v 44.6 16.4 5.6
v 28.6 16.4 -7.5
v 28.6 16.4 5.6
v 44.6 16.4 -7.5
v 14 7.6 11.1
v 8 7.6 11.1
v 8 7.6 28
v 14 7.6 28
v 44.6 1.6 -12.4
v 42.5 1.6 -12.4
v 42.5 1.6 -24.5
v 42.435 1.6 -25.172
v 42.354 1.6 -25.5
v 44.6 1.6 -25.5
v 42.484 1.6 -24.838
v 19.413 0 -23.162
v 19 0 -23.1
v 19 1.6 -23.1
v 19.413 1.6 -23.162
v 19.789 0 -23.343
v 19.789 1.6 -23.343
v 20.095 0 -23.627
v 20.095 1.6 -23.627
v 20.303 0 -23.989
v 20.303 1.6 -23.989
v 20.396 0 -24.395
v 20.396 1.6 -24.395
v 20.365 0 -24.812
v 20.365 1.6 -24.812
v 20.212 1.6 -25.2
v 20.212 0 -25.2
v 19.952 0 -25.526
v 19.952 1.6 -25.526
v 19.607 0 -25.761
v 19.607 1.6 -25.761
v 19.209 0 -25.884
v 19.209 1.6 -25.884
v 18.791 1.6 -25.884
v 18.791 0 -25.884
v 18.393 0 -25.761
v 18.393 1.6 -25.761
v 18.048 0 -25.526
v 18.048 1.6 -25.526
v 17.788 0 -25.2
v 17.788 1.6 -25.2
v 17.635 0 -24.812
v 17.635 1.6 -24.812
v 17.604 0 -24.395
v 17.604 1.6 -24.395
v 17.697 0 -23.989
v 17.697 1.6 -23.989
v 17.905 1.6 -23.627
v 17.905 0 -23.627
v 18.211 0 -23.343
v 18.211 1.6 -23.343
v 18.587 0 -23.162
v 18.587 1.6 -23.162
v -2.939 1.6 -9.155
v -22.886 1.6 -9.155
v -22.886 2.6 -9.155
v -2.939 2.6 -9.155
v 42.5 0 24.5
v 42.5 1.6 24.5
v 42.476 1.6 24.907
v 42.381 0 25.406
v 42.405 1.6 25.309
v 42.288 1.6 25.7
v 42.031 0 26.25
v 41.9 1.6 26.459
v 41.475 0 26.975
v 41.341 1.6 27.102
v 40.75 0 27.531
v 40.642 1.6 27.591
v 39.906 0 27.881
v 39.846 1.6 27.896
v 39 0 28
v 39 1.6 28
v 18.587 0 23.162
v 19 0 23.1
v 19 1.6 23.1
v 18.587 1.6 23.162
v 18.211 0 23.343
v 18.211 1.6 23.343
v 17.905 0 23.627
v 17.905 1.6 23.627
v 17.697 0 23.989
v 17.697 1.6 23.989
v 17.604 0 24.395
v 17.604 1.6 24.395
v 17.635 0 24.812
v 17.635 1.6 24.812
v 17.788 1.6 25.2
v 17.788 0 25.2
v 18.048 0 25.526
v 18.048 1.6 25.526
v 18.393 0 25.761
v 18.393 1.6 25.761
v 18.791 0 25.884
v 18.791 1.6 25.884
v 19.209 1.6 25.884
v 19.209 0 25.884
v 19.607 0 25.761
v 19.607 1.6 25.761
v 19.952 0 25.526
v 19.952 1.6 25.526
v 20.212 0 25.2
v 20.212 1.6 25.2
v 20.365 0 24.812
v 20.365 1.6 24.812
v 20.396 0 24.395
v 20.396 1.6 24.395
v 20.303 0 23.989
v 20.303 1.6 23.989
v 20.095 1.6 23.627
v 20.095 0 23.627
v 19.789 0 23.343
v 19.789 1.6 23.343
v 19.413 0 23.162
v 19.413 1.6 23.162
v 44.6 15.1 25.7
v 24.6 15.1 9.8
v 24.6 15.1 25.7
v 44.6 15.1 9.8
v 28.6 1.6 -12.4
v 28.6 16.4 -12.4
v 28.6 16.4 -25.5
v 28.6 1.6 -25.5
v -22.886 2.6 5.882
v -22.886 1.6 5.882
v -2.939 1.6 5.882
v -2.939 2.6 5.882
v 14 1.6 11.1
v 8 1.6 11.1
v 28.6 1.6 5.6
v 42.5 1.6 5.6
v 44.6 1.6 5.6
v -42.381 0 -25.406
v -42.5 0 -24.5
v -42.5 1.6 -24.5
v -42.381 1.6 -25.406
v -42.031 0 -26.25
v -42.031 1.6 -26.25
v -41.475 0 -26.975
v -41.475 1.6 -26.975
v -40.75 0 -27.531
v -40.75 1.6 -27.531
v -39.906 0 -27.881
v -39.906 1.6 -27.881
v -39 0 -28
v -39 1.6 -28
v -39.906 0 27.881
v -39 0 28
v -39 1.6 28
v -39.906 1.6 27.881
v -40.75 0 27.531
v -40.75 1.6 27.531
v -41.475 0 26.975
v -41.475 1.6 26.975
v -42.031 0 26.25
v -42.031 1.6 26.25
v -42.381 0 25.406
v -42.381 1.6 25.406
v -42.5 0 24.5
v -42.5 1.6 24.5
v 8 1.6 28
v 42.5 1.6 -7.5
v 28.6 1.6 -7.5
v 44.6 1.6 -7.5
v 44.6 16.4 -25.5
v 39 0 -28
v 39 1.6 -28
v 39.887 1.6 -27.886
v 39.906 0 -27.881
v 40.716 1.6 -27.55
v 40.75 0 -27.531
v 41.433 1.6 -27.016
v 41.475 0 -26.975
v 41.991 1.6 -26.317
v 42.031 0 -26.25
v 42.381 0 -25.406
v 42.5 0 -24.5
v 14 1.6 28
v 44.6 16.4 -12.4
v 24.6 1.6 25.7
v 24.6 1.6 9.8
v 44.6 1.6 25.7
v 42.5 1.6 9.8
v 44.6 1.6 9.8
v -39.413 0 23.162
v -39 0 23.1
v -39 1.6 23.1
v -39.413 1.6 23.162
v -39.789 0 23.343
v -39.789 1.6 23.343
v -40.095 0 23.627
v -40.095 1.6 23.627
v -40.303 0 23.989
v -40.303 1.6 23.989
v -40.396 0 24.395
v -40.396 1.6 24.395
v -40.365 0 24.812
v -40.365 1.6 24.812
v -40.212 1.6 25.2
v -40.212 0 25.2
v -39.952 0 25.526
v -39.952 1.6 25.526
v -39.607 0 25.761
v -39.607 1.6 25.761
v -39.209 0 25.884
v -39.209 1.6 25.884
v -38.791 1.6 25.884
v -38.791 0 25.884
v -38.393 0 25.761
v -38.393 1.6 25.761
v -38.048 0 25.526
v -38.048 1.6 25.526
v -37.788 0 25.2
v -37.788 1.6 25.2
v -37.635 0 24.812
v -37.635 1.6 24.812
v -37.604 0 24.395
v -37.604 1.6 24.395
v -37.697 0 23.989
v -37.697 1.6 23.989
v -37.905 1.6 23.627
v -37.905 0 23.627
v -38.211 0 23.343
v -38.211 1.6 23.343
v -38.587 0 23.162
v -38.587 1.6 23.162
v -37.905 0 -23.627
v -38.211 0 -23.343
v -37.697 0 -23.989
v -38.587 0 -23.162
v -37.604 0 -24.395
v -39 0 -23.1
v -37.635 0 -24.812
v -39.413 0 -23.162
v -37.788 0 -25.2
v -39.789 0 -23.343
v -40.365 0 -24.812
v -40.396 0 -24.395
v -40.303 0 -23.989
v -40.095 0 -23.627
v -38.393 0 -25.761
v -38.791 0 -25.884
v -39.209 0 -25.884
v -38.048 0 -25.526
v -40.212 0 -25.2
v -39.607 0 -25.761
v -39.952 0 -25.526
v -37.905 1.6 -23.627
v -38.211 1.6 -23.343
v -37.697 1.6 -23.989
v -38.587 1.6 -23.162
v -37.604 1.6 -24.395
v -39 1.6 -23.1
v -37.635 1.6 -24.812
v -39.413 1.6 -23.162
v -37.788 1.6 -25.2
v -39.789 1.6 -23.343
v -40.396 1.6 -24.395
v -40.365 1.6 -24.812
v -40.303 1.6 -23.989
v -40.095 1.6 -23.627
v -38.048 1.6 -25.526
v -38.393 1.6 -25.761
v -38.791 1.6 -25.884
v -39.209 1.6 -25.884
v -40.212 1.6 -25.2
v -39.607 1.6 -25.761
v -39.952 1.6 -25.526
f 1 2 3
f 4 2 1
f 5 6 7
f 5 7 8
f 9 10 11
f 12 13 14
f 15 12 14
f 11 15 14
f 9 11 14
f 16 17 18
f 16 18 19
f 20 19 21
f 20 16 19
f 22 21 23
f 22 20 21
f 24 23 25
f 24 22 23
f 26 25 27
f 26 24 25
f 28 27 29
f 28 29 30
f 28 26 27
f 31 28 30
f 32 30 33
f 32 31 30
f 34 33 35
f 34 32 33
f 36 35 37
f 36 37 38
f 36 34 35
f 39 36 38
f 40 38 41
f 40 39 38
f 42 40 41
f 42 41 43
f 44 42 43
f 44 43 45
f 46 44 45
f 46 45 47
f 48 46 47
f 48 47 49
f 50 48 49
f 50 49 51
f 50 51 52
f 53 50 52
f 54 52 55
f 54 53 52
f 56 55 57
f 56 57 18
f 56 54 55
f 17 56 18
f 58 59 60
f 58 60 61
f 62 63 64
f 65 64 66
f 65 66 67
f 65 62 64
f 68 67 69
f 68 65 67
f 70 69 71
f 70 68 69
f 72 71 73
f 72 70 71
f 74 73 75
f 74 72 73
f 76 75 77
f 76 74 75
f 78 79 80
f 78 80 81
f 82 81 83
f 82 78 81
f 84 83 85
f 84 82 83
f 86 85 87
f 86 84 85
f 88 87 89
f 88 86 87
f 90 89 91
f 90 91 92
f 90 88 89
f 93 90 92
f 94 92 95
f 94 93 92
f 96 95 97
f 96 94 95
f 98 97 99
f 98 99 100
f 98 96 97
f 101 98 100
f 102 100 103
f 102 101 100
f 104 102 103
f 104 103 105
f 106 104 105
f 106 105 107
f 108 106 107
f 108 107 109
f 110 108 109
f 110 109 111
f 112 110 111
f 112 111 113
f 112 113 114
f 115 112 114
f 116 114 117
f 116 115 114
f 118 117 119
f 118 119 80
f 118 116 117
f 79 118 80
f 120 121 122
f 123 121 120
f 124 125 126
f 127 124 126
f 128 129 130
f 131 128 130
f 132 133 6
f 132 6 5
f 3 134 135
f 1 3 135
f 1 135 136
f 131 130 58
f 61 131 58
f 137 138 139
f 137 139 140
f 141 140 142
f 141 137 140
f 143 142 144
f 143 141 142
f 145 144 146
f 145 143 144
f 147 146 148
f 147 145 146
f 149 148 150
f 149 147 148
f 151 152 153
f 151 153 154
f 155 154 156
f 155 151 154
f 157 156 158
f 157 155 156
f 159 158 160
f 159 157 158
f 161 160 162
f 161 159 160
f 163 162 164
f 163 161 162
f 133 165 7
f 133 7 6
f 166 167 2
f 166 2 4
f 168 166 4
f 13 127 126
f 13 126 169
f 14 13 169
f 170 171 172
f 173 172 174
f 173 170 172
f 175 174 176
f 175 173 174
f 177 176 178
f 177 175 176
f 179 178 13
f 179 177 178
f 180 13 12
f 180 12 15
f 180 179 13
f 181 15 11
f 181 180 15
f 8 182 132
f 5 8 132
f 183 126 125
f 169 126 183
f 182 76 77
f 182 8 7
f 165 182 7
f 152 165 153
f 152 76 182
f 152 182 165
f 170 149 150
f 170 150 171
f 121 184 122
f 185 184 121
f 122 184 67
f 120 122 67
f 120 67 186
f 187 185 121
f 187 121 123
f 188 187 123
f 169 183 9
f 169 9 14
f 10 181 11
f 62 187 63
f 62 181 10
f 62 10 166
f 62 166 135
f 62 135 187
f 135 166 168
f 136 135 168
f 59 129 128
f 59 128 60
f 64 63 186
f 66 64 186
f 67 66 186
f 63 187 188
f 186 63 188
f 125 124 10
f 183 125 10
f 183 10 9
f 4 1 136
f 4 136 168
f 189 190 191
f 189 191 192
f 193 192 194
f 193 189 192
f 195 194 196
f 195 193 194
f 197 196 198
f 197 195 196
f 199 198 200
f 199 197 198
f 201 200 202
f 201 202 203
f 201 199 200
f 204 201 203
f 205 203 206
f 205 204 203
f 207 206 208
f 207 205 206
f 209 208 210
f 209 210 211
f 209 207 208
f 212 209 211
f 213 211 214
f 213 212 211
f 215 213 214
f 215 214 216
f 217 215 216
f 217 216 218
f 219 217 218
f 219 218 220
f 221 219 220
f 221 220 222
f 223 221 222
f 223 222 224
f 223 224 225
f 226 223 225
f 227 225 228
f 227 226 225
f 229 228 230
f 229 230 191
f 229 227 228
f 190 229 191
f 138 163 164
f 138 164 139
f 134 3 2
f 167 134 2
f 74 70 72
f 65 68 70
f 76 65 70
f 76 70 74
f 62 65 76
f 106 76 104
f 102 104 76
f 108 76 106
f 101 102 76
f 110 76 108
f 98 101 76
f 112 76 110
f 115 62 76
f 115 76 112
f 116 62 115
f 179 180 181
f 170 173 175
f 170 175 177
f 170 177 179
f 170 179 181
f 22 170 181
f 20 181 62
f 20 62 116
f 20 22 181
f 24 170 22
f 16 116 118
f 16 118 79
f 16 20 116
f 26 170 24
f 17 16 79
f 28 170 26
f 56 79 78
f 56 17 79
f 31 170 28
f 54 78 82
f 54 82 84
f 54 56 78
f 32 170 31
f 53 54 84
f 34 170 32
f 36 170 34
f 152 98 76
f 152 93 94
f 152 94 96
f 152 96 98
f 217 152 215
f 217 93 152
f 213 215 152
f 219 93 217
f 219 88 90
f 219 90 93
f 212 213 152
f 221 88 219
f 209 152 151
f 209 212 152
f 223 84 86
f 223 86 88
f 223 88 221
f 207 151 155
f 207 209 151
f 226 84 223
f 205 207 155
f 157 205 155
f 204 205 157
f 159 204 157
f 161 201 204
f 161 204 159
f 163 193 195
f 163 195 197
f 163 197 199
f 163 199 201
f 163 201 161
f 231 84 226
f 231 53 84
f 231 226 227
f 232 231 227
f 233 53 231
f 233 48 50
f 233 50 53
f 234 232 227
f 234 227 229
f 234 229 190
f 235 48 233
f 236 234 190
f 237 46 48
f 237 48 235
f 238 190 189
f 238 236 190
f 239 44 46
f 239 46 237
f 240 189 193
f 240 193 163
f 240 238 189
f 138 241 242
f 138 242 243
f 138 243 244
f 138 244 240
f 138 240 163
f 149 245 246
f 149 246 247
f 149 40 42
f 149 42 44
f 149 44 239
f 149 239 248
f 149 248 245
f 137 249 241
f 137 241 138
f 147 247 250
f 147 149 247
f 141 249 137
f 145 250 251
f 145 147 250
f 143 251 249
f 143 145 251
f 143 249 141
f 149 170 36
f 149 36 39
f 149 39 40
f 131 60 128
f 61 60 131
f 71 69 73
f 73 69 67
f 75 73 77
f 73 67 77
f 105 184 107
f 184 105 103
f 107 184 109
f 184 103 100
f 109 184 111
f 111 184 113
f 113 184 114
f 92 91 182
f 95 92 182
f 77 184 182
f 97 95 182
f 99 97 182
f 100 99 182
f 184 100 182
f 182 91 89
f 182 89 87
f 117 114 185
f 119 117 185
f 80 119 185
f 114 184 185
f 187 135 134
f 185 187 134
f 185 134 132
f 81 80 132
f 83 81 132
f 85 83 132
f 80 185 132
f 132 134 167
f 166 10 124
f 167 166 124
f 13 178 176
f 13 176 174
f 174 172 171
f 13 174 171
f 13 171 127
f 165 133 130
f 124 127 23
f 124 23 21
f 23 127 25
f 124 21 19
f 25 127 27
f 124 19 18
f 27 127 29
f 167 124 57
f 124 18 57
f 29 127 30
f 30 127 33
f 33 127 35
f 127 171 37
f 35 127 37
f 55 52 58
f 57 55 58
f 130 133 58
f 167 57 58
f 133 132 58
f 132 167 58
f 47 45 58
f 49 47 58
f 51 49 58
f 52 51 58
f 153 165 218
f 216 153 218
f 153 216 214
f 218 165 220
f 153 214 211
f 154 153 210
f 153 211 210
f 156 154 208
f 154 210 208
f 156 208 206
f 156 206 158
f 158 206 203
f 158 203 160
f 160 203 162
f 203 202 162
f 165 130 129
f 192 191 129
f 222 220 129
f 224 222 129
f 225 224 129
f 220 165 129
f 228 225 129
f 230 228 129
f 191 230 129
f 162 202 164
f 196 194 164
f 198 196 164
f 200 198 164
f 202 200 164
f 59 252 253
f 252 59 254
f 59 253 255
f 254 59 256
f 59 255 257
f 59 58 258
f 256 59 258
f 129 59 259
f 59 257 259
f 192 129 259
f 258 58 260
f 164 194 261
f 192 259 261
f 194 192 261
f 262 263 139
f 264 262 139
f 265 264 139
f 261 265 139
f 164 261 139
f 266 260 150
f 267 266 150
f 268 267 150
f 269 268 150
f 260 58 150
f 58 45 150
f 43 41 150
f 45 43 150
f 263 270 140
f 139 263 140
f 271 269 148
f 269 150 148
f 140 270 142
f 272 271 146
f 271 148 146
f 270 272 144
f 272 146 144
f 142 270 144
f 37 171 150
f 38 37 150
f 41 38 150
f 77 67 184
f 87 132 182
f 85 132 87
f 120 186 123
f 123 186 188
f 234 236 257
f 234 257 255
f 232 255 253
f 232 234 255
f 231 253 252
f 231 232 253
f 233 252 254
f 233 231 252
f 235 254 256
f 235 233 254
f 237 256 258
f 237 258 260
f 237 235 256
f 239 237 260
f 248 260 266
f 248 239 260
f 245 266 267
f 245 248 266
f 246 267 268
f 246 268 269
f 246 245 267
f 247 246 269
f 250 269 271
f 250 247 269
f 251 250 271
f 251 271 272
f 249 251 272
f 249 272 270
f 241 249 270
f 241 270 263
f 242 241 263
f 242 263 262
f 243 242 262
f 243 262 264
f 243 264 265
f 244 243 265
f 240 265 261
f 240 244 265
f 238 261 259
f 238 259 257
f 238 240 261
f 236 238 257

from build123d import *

# Parameters (mm, degrees)
SKETCH1_R           = 1.4
BOSS_EXTRUDE1_DEPTH = 1.6
SKETCH2_W           = 20
SKETCH2_H           = 15.9
BOSS_EXTRUDE2_DEPTH = 13.5
SKETCH3_W           = 16
SKETCH3_H           = 13.1
BOSS_EXTRUDE3_DEPTH = 14.8
SKETCH4_W           = 6
SKETCH4_H           = 16.9
BOSS_EXTRUDE4_DEPTH = 6
SKETCH6_W           = 19.946979578
SKETCH6_H           = 15.036953836
BOSS_EXTRUDE5_DEPTH = 1


with BuildPart() as part:
    # Sketch1 → Boss-Extrude1 (new body)
    with BuildSketch(Plane(origin=(0, 0, 0), x_dir=(1, 0, 0), z_dir=(0, 1, 0))):
        with BuildLine():
            Line((-39, 28), (39, 28))
            ThreePointArc((39, 28), (41.474873734, 26.974873734), (42.5, 24.5))
            Line((42.5, 24.5), (42.5, -24.5))
            ThreePointArc((42.5, -24.5), (41.474873734, -26.974873734), (39, -28))
            Line((39, -28), (-39, -28))
            ThreePointArc((-39, -28), (-41.474873734, -26.974873734), (-42.5, -24.5))
            Line((-42.5, -24.5), (-42.5, 24.5))
            ThreePointArc((-42.5, 24.5), (-41.474873734, 26.974873734), (-39, 28))
        make_face()
        with Locations(Location((-39, 24.5, 0), (0, 0, 270))):
            Circle(SKETCH1_R, mode=Mode.SUBTRACT)
        with Locations(Location((19, 24.5, 0), (0, 0, 270))):
            Circle(SKETCH1_R, mode=Mode.SUBTRACT)
        with Locations(Location((19, -24.5, 0), (0, 0, 90))):
            Circle(SKETCH1_R, mode=Mode.SUBTRACT)
        with Locations(Location((-39, -24.5, 0), (0, 0, 90))):
            Circle(SKETCH1_R, mode=Mode.SUBTRACT)
    extrude(amount=BOSS_EXTRUDE1_DEPTH)

    # Sketch2 → Boss-Extrude2 (add)
    with BuildSketch(Plane(origin=(0, 1.6, 0), x_dir=(1, 0, 0), z_dir=(0, 1, 0))):
        with Locations((34.6, -17.75)):
            Rectangle(SKETCH2_W, SKETCH2_H)
    extrude(amount=BOSS_EXTRUDE2_DEPTH)

    # Sketch3 → Boss-Extrude3 (add)
    with BuildSketch(Plane(origin=(0, 1.6, 0), x_dir=(1, 0, 0), z_dir=(0, 1, 0))):
        with Locations((36.6, 0.95)):
            Rectangle(SKETCH3_W, SKETCH3_H)
        with Locations((36.6, 18.95)):
            Rectangle(SKETCH3_W, SKETCH3_H)
    extrude(amount=BOSS_EXTRUDE3_DEPTH)

    # Sketch4 → Boss-Extrude4 (add)
    with BuildSketch(Plane(origin=(0, 1.6, 0), x_dir=(1, 0, 0), z_dir=(0, 1, 0))):
        with Locations((11, -19.55)):
            Rectangle(SKETCH4_W, SKETCH4_H)
    extrude(amount=BOSS_EXTRUDE4_DEPTH)

    # Sketch6 → Boss-Extrude5 (add)
    with BuildSketch(Plane(origin=(0, 1.6, 0), x_dir=(1, 0, 0), z_dir=(0, 1, 0))):
        with Locations((-12.912885705, 1.636675247)):
            Rectangle(SKETCH6_W, SKETCH6_H)
    extrude(amount=BOSS_EXTRUDE5_DEPTH)


solid = part.part
